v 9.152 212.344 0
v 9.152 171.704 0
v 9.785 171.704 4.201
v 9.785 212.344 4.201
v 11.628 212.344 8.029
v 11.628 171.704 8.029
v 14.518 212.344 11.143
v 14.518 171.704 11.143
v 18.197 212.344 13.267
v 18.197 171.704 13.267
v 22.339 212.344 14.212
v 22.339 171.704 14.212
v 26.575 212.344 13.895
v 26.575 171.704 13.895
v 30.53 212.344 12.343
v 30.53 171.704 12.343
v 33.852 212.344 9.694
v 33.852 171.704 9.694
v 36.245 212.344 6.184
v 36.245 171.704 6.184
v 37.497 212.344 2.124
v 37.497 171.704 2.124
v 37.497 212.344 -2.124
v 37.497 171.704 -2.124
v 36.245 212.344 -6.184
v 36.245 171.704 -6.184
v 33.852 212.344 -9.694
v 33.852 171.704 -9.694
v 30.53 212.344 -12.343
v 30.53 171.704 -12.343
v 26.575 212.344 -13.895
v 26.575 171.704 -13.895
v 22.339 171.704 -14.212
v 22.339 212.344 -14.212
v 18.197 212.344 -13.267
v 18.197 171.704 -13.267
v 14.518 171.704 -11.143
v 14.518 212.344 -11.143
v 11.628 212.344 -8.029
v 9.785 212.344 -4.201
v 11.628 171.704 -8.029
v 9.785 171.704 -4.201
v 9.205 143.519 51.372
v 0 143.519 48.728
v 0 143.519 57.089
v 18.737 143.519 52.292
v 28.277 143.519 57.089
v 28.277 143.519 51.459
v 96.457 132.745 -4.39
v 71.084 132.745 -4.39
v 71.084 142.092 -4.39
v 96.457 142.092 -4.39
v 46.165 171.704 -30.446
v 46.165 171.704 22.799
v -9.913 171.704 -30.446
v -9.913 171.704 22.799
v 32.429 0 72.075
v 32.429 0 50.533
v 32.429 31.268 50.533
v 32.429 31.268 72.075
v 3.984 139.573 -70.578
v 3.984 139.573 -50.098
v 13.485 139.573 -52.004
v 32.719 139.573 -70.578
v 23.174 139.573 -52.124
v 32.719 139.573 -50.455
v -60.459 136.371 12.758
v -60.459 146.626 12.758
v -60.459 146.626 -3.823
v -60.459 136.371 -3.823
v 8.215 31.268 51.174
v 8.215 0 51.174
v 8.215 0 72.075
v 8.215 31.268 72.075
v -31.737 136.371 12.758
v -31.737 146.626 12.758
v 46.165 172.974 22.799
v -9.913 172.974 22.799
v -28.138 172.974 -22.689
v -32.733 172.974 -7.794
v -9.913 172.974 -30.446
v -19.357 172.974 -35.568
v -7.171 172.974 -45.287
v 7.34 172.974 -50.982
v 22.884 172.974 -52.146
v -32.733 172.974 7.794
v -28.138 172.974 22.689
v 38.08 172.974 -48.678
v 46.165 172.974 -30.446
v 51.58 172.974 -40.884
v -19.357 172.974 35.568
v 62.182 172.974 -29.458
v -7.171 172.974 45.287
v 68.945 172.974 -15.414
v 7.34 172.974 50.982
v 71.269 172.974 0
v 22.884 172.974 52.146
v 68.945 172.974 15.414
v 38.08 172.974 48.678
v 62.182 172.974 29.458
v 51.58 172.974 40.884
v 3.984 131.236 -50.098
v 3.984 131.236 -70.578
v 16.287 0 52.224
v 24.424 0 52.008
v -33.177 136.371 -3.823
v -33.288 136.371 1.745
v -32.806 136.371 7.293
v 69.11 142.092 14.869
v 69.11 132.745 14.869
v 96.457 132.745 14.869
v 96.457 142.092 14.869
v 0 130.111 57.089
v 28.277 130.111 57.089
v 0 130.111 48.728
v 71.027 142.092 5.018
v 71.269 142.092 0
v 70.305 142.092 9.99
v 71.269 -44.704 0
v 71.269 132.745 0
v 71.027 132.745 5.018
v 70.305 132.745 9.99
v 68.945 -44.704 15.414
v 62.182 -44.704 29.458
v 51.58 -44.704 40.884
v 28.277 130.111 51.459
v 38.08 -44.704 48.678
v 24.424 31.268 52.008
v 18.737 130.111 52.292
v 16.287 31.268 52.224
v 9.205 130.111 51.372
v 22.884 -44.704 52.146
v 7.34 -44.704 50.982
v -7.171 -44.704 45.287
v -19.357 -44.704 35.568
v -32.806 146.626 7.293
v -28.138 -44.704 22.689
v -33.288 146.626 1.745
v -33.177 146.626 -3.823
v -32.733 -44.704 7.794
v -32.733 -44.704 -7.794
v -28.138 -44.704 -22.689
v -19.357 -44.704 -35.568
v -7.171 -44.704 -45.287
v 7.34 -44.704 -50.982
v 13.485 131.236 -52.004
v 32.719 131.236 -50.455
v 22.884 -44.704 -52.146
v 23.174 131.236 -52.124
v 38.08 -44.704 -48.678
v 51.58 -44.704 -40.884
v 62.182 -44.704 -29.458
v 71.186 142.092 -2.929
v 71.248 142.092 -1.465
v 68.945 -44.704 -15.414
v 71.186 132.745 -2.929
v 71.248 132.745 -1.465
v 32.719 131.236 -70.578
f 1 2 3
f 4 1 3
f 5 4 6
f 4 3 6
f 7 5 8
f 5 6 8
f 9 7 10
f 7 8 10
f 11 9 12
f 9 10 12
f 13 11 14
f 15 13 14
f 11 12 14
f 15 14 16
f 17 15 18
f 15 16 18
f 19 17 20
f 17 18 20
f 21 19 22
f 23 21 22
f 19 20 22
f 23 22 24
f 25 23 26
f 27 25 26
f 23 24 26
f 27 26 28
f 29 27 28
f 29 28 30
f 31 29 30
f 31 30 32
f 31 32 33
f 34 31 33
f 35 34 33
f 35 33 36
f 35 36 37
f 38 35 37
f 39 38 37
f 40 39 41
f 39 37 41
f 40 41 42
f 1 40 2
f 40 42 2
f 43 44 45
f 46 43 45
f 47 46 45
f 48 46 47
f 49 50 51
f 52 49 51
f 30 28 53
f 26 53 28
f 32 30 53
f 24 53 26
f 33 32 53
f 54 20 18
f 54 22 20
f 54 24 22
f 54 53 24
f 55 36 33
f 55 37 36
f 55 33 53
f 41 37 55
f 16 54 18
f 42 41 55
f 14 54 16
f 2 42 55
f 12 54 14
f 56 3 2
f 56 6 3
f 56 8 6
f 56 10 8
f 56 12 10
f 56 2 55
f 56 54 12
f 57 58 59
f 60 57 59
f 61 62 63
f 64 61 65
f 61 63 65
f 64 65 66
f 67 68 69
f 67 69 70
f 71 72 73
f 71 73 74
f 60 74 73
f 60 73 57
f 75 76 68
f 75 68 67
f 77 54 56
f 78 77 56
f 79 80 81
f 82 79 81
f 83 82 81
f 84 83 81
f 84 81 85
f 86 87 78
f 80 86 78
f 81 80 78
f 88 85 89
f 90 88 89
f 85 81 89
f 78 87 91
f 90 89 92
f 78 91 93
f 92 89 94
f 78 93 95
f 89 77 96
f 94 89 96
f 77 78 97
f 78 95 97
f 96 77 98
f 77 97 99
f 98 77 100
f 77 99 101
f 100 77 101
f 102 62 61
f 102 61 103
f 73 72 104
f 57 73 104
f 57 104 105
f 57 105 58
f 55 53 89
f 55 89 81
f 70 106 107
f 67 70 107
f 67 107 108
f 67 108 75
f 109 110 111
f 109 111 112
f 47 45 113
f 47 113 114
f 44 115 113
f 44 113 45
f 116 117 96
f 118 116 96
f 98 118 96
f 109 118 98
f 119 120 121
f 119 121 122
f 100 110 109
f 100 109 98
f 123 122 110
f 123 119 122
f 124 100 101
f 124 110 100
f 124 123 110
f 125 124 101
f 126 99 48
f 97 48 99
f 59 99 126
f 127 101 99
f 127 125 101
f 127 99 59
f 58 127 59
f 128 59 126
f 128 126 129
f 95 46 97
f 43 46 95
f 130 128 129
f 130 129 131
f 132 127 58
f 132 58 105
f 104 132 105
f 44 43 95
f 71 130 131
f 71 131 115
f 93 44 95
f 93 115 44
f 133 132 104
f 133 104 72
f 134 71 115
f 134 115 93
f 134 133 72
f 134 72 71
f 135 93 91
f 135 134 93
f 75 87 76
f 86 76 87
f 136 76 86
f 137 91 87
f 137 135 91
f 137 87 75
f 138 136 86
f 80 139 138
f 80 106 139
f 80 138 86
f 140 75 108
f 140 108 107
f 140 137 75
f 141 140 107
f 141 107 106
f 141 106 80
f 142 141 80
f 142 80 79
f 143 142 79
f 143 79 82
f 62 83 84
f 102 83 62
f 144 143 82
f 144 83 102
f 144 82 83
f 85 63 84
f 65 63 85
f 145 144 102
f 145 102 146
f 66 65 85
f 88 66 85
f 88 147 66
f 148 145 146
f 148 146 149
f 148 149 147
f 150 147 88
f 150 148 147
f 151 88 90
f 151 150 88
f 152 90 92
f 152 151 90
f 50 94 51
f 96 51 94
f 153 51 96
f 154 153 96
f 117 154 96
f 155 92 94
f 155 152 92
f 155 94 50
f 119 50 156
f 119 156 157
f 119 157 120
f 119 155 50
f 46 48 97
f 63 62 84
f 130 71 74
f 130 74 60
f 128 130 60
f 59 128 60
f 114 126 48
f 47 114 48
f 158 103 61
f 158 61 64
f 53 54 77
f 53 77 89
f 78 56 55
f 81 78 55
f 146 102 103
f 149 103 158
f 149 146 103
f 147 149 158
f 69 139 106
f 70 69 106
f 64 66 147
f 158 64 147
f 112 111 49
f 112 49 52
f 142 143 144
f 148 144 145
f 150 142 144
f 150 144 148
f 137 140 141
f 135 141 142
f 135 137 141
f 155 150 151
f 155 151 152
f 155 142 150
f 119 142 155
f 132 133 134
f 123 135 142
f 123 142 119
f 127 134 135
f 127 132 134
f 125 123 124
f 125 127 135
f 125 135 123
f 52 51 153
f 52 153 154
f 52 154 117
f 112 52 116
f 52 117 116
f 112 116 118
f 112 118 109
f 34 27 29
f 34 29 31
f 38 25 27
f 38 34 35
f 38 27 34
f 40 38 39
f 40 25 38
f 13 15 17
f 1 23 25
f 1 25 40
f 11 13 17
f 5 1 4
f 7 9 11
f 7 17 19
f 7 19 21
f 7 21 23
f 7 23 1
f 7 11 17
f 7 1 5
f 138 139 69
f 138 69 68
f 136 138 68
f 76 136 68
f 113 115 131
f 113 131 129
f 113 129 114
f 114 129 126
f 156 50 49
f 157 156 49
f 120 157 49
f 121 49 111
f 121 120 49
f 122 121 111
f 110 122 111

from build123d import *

# Parameters (mm, degrees)
F0_W      = 56.0778109357
F0_H      = 53.2455928624
F1_DEPTH  = 44.704
F2_DEPTH  = 156.464
F3_W      = 24.2135291919
F3_H      = 31.2681160867
F4_DEPTH  = 49.276
F5_R      = 52.2926795061
F6_DEPTH  = 167.386
F7_W      = 28.2771997154
F7_H      = 13.4079456329
F8_DEPTH  = 34.29
F9_W      = 9.346306324
F9_H      = 19.2590444349
F10_DEPTH = 50.292
F11_W     = 10.2544277906
F11_H     = 16.5816796944
F12_DEPTH = 50.546
F13_W     = 28.7344292738
F13_H     = 8.3368938427
F14_DEPTH = 40.132
F15_DEPTH = 50.292
F16_W     = 56.0778109357
F16_H     = 53.2455928624
F17_DEPTH = 15.24
F18_R     = 14.2521119729
F19_DEPTH = 40.64


with BuildPart() as f1:
    # F0 (on Front) → F1 (new body)
    with BuildSketch(Plane.XZ):
        with Locations((18.1261622347, -3.8234870881)):
            Rectangle(F0_W, F0_H)
    extrude(amount=F1_DEPTH)

    # F2 (add): a face of the model
    f2_faces = [f1.faces().sort_by_distance(p)[0] for p in [
        (18.1261622347, 0, -3.8234870881),
    ]]
    extrude(f2_faces, amount=F2_DEPTH)

    # F3 (on face) → F4 (join)
    with BuildSketch(Plane.XY.offset(22.7993093431)):
        with Locations((20.3220699914, 15.6340580434)):
            Rectangle(F3_W, F3_H)
    extrude(amount=F4_DEPTH)

    # F5 (on face) → F6 (join)
    with BuildSketch(Plane.XZ.offset(44.704)):
        with Locations((18.975822255, 0)):
            Circle(F5_R)
    extrude(amount=-F6_DEPTH)

    # F7 (on face) → F8 (join)
    with BuildSketch(Plane.XY.offset(22.7993093431)):
        with Locations((14.1385998577, 136.814981699)):
            Rectangle(F7_W, F7_H)
    extrude(amount=F8_DEPTH)

    # F9 (on face) → F10 (join)
    with BuildSketch(Plane.YZ.offset(46.1650677025)):
        with Locations((137.4184936285, 5.2395930979)):
            Rectangle(F9_W, F9_H)
    extrude(amount=F10_DEPTH)

    # F11 (on face) → F12 (join)
    with BuildSketch(Plane(origin=(-9.9127432331, 0, 0), x_dir=(0, -1, 0), z_dir=(-1, 0, 0))):
        with Locations((-141.4983049035, 4.4673527591)):
            Rectangle(F11_W, F11_H)
    extrude(amount=F12_DEPTH)

    # F13 (on face) → F14 (join)
    with BuildSketch(Plane(origin=(0, 0, -30.4462835193), x_dir=(1, 0, 0), z_dir=(0, 0, -1))):
        with Locations((18.3513916563, -135.4045530787)):
            Rectangle(F13_W, F13_H)
    extrude(amount=F14_DEPTH)

    # F15 (add): a face of the model
    f15_faces = [f1.faces().sort_by_distance(p)[0] for p in [
        (-31.8377969197, 122.682, 0),
    ]]
    extrude(f15_faces, amount=F15_DEPTH)

    # F16 (on face) → F17 (join)
    with BuildSketch(Plane(origin=(0, 156.464, 0), x_dir=(-1, 0, 0), z_dir=(0, 1, 0))):
        with Locations((-18.1261622347, -3.8234870881)):
            Rectangle(F16_W, F16_H)
    extrude(amount=F17_DEPTH)

    # F18 (on face) → F19 (join)
    with BuildSketch(Plane(origin=(0, 171.704, 0), x_dir=(-1, 0, 0), z_dir=(0, 1, 0))):
        with Locations((-23.4041027725, 0)):
            Circle(F18_R)
    extrude(amount=F19_DEPTH)


solid = f1.part
